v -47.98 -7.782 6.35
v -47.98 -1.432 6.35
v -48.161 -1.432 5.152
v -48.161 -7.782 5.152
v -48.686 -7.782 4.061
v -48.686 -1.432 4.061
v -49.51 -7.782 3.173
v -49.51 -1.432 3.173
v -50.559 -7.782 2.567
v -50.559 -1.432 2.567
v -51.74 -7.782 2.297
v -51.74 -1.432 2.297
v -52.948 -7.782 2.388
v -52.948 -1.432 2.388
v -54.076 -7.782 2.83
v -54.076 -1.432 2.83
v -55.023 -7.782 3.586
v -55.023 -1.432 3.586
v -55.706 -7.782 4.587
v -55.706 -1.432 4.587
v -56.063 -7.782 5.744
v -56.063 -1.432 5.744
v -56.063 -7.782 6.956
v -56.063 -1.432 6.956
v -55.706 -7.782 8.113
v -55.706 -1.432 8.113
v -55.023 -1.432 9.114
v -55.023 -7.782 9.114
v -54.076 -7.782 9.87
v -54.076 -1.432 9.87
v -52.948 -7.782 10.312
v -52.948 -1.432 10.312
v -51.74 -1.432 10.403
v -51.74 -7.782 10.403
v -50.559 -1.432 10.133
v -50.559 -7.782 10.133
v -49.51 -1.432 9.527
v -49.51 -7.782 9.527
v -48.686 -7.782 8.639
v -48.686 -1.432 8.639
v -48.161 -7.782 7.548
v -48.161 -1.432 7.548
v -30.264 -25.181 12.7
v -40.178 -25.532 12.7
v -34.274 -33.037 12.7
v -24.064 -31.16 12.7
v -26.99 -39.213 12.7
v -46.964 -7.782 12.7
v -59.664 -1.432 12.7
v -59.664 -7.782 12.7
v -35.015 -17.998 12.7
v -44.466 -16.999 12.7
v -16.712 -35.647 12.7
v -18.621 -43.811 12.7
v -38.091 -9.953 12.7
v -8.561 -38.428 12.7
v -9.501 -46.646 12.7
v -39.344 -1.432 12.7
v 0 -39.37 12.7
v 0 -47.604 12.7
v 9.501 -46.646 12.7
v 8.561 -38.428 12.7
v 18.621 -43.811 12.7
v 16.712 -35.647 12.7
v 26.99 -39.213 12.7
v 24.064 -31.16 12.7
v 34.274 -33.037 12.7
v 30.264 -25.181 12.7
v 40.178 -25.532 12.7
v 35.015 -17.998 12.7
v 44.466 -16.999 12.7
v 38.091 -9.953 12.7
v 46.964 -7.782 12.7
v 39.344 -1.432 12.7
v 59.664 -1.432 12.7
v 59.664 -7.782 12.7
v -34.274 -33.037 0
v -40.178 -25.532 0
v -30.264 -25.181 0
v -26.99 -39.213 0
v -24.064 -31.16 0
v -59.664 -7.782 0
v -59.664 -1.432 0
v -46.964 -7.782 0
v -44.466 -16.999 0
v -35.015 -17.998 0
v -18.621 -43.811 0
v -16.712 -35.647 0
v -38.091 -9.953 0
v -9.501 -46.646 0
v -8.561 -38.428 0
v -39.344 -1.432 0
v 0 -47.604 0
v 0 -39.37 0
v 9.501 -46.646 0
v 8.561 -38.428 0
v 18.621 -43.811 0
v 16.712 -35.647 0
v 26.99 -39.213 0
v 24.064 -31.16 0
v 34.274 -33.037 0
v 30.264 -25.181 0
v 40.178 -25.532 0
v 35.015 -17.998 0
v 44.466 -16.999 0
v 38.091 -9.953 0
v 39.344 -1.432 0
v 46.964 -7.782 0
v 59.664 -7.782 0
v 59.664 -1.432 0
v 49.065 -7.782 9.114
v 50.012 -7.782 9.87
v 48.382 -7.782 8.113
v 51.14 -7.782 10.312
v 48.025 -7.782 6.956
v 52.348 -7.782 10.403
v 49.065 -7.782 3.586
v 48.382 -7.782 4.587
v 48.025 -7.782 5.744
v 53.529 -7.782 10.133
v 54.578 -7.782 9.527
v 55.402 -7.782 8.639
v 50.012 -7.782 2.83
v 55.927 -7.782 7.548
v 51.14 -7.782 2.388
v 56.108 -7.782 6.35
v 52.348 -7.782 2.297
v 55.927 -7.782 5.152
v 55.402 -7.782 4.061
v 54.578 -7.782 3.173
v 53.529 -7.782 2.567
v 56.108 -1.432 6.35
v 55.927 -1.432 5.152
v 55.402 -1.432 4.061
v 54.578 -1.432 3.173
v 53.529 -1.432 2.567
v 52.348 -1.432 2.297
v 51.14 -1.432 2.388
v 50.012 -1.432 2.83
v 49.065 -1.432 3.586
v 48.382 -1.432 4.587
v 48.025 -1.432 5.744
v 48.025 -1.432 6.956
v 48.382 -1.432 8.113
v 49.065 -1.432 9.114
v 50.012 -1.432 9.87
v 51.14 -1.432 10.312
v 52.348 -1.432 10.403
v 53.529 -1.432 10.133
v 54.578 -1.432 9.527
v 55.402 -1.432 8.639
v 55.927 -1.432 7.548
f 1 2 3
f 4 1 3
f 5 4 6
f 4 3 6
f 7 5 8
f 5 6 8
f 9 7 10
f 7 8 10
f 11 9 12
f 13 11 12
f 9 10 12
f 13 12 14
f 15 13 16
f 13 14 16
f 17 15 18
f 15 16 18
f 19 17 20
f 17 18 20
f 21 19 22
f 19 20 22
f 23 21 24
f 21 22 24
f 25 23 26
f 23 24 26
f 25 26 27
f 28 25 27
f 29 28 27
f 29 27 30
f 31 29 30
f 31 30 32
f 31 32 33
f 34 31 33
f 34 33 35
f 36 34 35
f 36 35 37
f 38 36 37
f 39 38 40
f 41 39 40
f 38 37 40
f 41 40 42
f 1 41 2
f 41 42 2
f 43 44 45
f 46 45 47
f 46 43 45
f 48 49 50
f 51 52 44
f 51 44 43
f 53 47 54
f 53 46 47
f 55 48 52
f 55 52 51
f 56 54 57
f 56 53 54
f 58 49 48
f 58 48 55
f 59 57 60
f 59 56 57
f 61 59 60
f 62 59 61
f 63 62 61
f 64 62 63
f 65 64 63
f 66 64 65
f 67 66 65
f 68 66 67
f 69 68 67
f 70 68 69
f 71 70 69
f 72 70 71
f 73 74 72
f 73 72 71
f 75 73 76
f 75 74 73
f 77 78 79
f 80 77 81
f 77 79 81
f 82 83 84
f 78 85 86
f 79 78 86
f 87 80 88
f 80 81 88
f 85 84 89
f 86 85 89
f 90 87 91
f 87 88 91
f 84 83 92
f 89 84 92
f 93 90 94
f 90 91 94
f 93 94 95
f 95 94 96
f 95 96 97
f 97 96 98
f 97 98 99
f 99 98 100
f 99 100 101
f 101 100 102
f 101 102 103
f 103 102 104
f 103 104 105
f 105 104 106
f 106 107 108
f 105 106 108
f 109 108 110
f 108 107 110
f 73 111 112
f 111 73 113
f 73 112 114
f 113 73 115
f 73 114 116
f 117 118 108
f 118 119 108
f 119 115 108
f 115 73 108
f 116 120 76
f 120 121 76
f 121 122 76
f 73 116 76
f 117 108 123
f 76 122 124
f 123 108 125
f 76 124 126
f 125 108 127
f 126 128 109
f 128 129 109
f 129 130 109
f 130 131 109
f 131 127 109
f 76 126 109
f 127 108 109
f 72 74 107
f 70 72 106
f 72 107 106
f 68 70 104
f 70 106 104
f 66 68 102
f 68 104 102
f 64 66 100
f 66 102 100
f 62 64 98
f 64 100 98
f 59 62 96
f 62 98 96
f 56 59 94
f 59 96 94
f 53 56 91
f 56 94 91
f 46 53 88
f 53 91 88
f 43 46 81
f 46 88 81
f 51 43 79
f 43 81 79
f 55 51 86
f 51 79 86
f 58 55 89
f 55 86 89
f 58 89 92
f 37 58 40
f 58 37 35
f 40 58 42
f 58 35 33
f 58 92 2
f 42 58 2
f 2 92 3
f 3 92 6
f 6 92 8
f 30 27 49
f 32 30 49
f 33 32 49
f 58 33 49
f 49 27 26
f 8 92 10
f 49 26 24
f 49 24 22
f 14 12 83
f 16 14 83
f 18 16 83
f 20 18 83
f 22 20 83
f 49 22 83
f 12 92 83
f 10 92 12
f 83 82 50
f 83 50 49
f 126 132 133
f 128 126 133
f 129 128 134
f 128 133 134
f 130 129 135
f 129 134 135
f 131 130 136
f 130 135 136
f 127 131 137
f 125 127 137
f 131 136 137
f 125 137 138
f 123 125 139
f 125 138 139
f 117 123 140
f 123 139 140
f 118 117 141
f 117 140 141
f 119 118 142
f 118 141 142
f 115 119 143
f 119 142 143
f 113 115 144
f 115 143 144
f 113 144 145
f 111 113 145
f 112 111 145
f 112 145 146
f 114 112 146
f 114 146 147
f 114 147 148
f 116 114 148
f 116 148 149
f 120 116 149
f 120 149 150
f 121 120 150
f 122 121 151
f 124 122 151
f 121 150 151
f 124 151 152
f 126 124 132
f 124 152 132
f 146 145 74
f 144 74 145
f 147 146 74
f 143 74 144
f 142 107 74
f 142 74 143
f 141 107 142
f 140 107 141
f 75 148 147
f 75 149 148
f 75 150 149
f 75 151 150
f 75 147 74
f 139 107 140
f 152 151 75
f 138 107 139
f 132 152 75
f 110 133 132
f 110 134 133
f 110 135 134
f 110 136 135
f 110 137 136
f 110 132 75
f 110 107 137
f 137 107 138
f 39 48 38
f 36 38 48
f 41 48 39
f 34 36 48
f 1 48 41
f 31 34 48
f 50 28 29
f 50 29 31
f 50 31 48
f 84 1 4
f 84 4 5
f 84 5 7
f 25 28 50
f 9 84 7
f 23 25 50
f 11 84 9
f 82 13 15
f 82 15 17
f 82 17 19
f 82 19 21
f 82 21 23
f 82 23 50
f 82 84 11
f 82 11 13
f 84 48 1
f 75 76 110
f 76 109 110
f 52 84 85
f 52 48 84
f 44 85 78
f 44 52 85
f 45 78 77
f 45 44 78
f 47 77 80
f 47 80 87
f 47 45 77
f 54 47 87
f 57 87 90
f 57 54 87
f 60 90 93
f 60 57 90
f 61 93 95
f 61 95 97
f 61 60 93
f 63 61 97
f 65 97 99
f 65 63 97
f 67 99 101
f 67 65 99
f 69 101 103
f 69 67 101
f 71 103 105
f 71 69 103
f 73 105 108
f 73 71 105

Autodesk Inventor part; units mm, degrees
ref_plane "YZ Plane" through (0, 0, 0) normal (1, 0, 0) x (0, 1, 0)
ref_plane "XZ Plane" through (0, 0, 0) normal (0, 1, 0) x (-1, 0, 0)
ref_plane "XY Plane" through (0, 0, 0) normal (0, 0, 1) x (1, 0, 0)
sketch "Sketch1" plane through (0, 0, 0) normal (0, 0, 1) x (1, 0, 0)
  arc A0 (-39.344, -1.4316) -> (39.344, -1.4316) centre (0, 0) ccw
  line L0 (-39.344, -1.4316) -> (-39.3671, -1.4316)
  line L1 (-39.344, -1.4316) -> (-52.044, -1.4316)
  line L2 (39.344, -1.4316) -> (52.044, -1.4316)
  arc A1 (-46.964, -22.4724) -> (46.964, -22.4724) centre (0, 0) ccw
  line L3 (-52.044, -1.4316) -> (-59.664, -1.4316)
  line L4 (52.044, -1.4316) -> (59.664, -1.4316)
  line L5 (39.344, -1.4316) -> (46.964, -1.4316)
  line L6 (46.964, -1.4316) -> (46.964, -22.4724)
  line L7 (-39.344, -1.4316) -> (-45.694, -1.4316)
  line L8 (-39.344, -1.4316) -> (-46.964, -1.4316)
  line L9 (-46.964, -1.4316) -> (-46.964, -22.4724)
  line L10 (-46.964, -7.7816) -> (-59.664, -7.7816)
  line L11 (-59.664, -7.7816) -> (-59.664, -1.4316)
  line L12 (46.964, -7.7816) -> (59.664, -7.7816)
  line L13 (59.664, -7.7816) -> (59.664, -1.4316)
  line L14 (46.964, -42.5386) -> (30.0181, -42.5386)
  line L15 (46.964, -22.4724) -> (46.964, -42.5386)
  line L16 (46.964, -42.5386) -> (-46.964, -42.5386)
  line L17 (-46.964, -42.5386) -> (-46.964, -22.4724)
  line L18 (-46.964, -42.5386) -> (46.964, -42.5386)
  line L19 (46.964, -42.5386) -> (46.964, -52.2316)
  line L20 (46.964, -52.2316) -> (-46.964, -52.2316)
  line L21 (-46.964, -52.2316) -> (-46.964, -42.5386)
  line L22 (-46.964, -22.4724) -> (-32.3263, -22.4724)
  line L23 (32.3263, -22.4724) -> (46.964, -22.4724)
  dimension "d0" = 78.74
  dimension "d1" = 12.7
  dimension "d2" = 12.7
  dimension "d4" = 7.62
  dimension "d5" = 7.62
  dimension "d6" = 7.62
  dimension "d7" = 7.62
  dimension "d8" = 6.35
  dimension "d9" = 6.35
  dimension "d20" = 50.8
extrude "Extrusion1" add sketch "Sketch1" along normal blind 12.7
sketch "Sketch2" plane through (-59.664, -1.4316, 0) normal (0, 1, 0) x (1, 0, 0)
  line L0 (20.32, 0) -> (0, 0) projected
  line L1 (0, 0) -> (20.32, 0)
  circle A0 centre (7.62, -6.35) radius 4.064
  circle A1 centre (111.7079, -6.35) radius 4.064
  line L2 (99.0079, 0) -> (99.0079, -12.7) projected
  line L3 (20.32, 0) -> (20.32, -12.7) projected
  point P0 (59.664, 0)
  dimension "d14" = 12.7
  dimension "d15" = 12.7
  dimension "d16" = 8.128
  dimension "d17" = 8.128
extrude "Extrusion2" cut sketch "Sketch2" against normal blind 25.4
sketch "Sketch3" plane through (0, 0, 12.7) normal (0, 0, 1) x (1, 0, 0)
  arc A0 (-39.344, -1.4316) -> (39.344, -1.4316) centre (0, 0) ccw projected
  arc A1 (39.344, -1.4316) -> (-39.344, -1.4316) centre (0, 0) ccw
  line L0 (-59.664, -7.7816) -> (-46.964, -7.7816) projected
  line L1 (46.964, -52.2316) -> (46.964, -7.7816) projected
  arc A2 (-46.964, -7.7816) -> (46.964, -7.7816) centre (0, 0) ccw
  line L2 (-46.964, -7.7816) -> (-46.964, -52.2316) projected
  line L3 (46.964, -7.7816) -> (-46.964, -7.7816)
  line L4 (-46.964, -7.7816) -> (-46.964, -52.2316)
  line L5 (-46.964, -52.2316) -> (46.964, -52.2316)
  line L6 (46.964, -52.2316) -> (46.964, -7.7816)
extrude "Extrusion3" cut sketch "Sketch3" against normal blind 25.4 contours A2 L1 L5 L2
properties part number "MOTOR MOUNT REAL TOP E3O MOTOR"
